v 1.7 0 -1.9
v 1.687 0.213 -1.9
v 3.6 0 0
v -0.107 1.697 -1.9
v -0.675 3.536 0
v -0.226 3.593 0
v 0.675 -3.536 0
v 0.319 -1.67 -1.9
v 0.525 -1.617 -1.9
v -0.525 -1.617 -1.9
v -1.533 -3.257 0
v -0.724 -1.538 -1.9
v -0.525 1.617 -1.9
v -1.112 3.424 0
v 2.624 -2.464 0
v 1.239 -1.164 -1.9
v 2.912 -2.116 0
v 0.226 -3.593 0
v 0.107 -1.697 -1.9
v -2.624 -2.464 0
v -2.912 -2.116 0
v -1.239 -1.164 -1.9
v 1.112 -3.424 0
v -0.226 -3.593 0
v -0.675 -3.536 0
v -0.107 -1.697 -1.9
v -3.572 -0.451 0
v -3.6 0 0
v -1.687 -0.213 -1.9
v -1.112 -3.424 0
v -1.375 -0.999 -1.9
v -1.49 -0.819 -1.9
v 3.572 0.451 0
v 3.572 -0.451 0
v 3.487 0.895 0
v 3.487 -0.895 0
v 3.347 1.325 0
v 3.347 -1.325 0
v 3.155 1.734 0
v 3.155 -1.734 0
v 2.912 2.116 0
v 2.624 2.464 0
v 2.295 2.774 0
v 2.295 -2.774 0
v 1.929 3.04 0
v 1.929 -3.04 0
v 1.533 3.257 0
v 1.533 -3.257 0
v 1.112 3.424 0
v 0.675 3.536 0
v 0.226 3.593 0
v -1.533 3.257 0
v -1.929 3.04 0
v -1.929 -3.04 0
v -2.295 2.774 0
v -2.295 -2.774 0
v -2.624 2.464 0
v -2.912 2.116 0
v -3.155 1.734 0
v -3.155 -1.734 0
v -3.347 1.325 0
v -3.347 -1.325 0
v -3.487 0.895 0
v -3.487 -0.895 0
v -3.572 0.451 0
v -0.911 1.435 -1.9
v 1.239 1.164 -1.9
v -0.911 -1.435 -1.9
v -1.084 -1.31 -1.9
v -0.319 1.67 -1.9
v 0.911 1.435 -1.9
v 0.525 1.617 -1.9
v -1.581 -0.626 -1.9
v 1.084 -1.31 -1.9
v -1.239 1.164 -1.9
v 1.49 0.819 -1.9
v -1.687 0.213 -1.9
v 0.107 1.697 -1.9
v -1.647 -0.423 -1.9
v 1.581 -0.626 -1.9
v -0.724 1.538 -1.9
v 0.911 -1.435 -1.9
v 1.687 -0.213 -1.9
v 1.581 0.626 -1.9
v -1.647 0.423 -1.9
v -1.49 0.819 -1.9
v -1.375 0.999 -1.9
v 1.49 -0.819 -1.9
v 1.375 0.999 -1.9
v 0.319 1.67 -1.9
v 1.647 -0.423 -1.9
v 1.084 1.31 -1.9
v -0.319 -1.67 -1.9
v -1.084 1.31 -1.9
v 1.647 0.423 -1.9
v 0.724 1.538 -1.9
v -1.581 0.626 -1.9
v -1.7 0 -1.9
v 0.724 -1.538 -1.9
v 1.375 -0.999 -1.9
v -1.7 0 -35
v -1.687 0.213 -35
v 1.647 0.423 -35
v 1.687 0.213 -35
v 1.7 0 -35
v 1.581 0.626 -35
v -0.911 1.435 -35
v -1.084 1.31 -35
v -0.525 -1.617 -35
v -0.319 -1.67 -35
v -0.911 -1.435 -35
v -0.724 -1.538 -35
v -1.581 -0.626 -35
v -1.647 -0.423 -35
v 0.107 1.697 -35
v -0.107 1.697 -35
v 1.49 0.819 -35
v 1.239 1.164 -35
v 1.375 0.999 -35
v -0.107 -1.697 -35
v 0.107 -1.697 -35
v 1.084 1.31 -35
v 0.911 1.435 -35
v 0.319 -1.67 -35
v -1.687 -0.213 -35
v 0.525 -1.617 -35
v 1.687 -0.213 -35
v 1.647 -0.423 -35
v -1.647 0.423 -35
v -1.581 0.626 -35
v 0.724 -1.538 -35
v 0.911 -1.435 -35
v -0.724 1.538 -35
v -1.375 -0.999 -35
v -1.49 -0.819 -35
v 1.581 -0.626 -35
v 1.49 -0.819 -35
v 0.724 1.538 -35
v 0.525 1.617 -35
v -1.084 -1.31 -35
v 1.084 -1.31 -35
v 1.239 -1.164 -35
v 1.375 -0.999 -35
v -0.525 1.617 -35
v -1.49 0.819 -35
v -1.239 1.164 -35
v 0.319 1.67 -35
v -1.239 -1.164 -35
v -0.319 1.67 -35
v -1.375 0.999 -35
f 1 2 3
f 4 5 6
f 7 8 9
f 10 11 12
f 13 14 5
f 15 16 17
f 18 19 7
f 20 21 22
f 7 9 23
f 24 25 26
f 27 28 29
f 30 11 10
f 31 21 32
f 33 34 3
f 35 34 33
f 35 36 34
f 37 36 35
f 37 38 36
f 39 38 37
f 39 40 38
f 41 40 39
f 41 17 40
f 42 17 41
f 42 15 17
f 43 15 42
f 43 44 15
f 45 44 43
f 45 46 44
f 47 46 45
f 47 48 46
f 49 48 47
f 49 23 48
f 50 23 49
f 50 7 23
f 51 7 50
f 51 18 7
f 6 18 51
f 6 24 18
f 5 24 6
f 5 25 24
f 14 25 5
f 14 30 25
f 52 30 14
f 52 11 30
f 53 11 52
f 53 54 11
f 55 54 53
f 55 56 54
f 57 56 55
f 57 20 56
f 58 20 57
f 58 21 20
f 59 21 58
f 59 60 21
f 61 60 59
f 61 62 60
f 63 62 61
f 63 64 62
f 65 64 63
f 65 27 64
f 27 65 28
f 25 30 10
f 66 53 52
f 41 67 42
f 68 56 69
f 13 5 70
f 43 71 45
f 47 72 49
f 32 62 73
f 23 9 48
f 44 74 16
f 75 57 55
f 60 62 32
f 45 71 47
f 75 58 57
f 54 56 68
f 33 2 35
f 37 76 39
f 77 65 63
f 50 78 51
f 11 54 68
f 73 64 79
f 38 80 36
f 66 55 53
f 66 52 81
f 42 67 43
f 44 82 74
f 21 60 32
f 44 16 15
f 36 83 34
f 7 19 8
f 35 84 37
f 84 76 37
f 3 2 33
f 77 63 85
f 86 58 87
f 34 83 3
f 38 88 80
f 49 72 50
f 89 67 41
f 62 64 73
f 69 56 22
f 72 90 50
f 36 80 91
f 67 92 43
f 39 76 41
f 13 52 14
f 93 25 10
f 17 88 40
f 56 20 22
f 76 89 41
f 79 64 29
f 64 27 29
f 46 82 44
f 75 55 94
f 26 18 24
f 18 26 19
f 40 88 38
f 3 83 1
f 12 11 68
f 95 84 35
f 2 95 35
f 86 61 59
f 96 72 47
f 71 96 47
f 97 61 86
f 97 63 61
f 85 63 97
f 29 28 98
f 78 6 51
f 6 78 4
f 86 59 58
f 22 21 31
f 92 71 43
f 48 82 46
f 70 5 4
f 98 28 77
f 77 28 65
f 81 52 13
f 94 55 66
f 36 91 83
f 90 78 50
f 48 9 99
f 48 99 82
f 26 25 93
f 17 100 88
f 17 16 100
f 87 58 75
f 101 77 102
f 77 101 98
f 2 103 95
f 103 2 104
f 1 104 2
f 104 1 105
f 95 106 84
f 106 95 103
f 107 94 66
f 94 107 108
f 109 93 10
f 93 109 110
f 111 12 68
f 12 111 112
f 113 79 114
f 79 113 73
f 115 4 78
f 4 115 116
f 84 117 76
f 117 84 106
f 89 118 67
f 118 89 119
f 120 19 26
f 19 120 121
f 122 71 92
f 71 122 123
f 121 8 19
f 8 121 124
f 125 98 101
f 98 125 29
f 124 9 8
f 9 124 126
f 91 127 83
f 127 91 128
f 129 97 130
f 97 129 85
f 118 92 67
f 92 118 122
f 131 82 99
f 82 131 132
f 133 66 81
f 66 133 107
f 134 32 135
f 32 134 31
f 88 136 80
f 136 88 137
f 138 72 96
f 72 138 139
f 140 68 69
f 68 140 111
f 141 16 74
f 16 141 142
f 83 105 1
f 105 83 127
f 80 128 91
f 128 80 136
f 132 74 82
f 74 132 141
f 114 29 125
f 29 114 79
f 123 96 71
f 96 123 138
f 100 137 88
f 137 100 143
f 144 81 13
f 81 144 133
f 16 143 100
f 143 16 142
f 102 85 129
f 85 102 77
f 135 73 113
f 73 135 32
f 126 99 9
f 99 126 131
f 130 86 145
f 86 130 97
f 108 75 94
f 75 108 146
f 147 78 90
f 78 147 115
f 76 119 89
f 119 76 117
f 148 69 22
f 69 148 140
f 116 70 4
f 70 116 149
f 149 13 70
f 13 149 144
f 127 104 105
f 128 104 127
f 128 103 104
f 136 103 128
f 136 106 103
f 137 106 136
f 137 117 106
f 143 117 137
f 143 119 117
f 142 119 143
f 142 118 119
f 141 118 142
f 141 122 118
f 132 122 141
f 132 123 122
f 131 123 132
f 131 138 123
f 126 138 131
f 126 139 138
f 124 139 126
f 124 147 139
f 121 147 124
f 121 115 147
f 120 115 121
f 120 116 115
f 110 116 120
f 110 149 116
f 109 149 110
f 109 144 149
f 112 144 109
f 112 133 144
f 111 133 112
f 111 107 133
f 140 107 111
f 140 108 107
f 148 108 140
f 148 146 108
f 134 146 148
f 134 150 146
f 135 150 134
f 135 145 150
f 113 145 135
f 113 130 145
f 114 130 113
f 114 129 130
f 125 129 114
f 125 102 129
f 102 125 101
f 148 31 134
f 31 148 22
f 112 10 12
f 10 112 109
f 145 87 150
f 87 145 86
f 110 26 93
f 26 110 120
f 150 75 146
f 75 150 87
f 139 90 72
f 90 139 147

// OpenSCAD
$fn = 50;


difference() {
	union() {
		translate(v = [0, 0, -1.9000000000]) {
			rotate(a = [0, 0, 0]) {
				cylinder(h = 1.9000000000, r1 = 1.7000000000, r2 = 3.6000000000);
			}
		}
		translate(v = [0, 0, -35]) {
			rotate(a = [0, 0, 0]) {
				cylinder(h = 35, r = 1.7000000000);
			}
		}
	}
	union();
}
